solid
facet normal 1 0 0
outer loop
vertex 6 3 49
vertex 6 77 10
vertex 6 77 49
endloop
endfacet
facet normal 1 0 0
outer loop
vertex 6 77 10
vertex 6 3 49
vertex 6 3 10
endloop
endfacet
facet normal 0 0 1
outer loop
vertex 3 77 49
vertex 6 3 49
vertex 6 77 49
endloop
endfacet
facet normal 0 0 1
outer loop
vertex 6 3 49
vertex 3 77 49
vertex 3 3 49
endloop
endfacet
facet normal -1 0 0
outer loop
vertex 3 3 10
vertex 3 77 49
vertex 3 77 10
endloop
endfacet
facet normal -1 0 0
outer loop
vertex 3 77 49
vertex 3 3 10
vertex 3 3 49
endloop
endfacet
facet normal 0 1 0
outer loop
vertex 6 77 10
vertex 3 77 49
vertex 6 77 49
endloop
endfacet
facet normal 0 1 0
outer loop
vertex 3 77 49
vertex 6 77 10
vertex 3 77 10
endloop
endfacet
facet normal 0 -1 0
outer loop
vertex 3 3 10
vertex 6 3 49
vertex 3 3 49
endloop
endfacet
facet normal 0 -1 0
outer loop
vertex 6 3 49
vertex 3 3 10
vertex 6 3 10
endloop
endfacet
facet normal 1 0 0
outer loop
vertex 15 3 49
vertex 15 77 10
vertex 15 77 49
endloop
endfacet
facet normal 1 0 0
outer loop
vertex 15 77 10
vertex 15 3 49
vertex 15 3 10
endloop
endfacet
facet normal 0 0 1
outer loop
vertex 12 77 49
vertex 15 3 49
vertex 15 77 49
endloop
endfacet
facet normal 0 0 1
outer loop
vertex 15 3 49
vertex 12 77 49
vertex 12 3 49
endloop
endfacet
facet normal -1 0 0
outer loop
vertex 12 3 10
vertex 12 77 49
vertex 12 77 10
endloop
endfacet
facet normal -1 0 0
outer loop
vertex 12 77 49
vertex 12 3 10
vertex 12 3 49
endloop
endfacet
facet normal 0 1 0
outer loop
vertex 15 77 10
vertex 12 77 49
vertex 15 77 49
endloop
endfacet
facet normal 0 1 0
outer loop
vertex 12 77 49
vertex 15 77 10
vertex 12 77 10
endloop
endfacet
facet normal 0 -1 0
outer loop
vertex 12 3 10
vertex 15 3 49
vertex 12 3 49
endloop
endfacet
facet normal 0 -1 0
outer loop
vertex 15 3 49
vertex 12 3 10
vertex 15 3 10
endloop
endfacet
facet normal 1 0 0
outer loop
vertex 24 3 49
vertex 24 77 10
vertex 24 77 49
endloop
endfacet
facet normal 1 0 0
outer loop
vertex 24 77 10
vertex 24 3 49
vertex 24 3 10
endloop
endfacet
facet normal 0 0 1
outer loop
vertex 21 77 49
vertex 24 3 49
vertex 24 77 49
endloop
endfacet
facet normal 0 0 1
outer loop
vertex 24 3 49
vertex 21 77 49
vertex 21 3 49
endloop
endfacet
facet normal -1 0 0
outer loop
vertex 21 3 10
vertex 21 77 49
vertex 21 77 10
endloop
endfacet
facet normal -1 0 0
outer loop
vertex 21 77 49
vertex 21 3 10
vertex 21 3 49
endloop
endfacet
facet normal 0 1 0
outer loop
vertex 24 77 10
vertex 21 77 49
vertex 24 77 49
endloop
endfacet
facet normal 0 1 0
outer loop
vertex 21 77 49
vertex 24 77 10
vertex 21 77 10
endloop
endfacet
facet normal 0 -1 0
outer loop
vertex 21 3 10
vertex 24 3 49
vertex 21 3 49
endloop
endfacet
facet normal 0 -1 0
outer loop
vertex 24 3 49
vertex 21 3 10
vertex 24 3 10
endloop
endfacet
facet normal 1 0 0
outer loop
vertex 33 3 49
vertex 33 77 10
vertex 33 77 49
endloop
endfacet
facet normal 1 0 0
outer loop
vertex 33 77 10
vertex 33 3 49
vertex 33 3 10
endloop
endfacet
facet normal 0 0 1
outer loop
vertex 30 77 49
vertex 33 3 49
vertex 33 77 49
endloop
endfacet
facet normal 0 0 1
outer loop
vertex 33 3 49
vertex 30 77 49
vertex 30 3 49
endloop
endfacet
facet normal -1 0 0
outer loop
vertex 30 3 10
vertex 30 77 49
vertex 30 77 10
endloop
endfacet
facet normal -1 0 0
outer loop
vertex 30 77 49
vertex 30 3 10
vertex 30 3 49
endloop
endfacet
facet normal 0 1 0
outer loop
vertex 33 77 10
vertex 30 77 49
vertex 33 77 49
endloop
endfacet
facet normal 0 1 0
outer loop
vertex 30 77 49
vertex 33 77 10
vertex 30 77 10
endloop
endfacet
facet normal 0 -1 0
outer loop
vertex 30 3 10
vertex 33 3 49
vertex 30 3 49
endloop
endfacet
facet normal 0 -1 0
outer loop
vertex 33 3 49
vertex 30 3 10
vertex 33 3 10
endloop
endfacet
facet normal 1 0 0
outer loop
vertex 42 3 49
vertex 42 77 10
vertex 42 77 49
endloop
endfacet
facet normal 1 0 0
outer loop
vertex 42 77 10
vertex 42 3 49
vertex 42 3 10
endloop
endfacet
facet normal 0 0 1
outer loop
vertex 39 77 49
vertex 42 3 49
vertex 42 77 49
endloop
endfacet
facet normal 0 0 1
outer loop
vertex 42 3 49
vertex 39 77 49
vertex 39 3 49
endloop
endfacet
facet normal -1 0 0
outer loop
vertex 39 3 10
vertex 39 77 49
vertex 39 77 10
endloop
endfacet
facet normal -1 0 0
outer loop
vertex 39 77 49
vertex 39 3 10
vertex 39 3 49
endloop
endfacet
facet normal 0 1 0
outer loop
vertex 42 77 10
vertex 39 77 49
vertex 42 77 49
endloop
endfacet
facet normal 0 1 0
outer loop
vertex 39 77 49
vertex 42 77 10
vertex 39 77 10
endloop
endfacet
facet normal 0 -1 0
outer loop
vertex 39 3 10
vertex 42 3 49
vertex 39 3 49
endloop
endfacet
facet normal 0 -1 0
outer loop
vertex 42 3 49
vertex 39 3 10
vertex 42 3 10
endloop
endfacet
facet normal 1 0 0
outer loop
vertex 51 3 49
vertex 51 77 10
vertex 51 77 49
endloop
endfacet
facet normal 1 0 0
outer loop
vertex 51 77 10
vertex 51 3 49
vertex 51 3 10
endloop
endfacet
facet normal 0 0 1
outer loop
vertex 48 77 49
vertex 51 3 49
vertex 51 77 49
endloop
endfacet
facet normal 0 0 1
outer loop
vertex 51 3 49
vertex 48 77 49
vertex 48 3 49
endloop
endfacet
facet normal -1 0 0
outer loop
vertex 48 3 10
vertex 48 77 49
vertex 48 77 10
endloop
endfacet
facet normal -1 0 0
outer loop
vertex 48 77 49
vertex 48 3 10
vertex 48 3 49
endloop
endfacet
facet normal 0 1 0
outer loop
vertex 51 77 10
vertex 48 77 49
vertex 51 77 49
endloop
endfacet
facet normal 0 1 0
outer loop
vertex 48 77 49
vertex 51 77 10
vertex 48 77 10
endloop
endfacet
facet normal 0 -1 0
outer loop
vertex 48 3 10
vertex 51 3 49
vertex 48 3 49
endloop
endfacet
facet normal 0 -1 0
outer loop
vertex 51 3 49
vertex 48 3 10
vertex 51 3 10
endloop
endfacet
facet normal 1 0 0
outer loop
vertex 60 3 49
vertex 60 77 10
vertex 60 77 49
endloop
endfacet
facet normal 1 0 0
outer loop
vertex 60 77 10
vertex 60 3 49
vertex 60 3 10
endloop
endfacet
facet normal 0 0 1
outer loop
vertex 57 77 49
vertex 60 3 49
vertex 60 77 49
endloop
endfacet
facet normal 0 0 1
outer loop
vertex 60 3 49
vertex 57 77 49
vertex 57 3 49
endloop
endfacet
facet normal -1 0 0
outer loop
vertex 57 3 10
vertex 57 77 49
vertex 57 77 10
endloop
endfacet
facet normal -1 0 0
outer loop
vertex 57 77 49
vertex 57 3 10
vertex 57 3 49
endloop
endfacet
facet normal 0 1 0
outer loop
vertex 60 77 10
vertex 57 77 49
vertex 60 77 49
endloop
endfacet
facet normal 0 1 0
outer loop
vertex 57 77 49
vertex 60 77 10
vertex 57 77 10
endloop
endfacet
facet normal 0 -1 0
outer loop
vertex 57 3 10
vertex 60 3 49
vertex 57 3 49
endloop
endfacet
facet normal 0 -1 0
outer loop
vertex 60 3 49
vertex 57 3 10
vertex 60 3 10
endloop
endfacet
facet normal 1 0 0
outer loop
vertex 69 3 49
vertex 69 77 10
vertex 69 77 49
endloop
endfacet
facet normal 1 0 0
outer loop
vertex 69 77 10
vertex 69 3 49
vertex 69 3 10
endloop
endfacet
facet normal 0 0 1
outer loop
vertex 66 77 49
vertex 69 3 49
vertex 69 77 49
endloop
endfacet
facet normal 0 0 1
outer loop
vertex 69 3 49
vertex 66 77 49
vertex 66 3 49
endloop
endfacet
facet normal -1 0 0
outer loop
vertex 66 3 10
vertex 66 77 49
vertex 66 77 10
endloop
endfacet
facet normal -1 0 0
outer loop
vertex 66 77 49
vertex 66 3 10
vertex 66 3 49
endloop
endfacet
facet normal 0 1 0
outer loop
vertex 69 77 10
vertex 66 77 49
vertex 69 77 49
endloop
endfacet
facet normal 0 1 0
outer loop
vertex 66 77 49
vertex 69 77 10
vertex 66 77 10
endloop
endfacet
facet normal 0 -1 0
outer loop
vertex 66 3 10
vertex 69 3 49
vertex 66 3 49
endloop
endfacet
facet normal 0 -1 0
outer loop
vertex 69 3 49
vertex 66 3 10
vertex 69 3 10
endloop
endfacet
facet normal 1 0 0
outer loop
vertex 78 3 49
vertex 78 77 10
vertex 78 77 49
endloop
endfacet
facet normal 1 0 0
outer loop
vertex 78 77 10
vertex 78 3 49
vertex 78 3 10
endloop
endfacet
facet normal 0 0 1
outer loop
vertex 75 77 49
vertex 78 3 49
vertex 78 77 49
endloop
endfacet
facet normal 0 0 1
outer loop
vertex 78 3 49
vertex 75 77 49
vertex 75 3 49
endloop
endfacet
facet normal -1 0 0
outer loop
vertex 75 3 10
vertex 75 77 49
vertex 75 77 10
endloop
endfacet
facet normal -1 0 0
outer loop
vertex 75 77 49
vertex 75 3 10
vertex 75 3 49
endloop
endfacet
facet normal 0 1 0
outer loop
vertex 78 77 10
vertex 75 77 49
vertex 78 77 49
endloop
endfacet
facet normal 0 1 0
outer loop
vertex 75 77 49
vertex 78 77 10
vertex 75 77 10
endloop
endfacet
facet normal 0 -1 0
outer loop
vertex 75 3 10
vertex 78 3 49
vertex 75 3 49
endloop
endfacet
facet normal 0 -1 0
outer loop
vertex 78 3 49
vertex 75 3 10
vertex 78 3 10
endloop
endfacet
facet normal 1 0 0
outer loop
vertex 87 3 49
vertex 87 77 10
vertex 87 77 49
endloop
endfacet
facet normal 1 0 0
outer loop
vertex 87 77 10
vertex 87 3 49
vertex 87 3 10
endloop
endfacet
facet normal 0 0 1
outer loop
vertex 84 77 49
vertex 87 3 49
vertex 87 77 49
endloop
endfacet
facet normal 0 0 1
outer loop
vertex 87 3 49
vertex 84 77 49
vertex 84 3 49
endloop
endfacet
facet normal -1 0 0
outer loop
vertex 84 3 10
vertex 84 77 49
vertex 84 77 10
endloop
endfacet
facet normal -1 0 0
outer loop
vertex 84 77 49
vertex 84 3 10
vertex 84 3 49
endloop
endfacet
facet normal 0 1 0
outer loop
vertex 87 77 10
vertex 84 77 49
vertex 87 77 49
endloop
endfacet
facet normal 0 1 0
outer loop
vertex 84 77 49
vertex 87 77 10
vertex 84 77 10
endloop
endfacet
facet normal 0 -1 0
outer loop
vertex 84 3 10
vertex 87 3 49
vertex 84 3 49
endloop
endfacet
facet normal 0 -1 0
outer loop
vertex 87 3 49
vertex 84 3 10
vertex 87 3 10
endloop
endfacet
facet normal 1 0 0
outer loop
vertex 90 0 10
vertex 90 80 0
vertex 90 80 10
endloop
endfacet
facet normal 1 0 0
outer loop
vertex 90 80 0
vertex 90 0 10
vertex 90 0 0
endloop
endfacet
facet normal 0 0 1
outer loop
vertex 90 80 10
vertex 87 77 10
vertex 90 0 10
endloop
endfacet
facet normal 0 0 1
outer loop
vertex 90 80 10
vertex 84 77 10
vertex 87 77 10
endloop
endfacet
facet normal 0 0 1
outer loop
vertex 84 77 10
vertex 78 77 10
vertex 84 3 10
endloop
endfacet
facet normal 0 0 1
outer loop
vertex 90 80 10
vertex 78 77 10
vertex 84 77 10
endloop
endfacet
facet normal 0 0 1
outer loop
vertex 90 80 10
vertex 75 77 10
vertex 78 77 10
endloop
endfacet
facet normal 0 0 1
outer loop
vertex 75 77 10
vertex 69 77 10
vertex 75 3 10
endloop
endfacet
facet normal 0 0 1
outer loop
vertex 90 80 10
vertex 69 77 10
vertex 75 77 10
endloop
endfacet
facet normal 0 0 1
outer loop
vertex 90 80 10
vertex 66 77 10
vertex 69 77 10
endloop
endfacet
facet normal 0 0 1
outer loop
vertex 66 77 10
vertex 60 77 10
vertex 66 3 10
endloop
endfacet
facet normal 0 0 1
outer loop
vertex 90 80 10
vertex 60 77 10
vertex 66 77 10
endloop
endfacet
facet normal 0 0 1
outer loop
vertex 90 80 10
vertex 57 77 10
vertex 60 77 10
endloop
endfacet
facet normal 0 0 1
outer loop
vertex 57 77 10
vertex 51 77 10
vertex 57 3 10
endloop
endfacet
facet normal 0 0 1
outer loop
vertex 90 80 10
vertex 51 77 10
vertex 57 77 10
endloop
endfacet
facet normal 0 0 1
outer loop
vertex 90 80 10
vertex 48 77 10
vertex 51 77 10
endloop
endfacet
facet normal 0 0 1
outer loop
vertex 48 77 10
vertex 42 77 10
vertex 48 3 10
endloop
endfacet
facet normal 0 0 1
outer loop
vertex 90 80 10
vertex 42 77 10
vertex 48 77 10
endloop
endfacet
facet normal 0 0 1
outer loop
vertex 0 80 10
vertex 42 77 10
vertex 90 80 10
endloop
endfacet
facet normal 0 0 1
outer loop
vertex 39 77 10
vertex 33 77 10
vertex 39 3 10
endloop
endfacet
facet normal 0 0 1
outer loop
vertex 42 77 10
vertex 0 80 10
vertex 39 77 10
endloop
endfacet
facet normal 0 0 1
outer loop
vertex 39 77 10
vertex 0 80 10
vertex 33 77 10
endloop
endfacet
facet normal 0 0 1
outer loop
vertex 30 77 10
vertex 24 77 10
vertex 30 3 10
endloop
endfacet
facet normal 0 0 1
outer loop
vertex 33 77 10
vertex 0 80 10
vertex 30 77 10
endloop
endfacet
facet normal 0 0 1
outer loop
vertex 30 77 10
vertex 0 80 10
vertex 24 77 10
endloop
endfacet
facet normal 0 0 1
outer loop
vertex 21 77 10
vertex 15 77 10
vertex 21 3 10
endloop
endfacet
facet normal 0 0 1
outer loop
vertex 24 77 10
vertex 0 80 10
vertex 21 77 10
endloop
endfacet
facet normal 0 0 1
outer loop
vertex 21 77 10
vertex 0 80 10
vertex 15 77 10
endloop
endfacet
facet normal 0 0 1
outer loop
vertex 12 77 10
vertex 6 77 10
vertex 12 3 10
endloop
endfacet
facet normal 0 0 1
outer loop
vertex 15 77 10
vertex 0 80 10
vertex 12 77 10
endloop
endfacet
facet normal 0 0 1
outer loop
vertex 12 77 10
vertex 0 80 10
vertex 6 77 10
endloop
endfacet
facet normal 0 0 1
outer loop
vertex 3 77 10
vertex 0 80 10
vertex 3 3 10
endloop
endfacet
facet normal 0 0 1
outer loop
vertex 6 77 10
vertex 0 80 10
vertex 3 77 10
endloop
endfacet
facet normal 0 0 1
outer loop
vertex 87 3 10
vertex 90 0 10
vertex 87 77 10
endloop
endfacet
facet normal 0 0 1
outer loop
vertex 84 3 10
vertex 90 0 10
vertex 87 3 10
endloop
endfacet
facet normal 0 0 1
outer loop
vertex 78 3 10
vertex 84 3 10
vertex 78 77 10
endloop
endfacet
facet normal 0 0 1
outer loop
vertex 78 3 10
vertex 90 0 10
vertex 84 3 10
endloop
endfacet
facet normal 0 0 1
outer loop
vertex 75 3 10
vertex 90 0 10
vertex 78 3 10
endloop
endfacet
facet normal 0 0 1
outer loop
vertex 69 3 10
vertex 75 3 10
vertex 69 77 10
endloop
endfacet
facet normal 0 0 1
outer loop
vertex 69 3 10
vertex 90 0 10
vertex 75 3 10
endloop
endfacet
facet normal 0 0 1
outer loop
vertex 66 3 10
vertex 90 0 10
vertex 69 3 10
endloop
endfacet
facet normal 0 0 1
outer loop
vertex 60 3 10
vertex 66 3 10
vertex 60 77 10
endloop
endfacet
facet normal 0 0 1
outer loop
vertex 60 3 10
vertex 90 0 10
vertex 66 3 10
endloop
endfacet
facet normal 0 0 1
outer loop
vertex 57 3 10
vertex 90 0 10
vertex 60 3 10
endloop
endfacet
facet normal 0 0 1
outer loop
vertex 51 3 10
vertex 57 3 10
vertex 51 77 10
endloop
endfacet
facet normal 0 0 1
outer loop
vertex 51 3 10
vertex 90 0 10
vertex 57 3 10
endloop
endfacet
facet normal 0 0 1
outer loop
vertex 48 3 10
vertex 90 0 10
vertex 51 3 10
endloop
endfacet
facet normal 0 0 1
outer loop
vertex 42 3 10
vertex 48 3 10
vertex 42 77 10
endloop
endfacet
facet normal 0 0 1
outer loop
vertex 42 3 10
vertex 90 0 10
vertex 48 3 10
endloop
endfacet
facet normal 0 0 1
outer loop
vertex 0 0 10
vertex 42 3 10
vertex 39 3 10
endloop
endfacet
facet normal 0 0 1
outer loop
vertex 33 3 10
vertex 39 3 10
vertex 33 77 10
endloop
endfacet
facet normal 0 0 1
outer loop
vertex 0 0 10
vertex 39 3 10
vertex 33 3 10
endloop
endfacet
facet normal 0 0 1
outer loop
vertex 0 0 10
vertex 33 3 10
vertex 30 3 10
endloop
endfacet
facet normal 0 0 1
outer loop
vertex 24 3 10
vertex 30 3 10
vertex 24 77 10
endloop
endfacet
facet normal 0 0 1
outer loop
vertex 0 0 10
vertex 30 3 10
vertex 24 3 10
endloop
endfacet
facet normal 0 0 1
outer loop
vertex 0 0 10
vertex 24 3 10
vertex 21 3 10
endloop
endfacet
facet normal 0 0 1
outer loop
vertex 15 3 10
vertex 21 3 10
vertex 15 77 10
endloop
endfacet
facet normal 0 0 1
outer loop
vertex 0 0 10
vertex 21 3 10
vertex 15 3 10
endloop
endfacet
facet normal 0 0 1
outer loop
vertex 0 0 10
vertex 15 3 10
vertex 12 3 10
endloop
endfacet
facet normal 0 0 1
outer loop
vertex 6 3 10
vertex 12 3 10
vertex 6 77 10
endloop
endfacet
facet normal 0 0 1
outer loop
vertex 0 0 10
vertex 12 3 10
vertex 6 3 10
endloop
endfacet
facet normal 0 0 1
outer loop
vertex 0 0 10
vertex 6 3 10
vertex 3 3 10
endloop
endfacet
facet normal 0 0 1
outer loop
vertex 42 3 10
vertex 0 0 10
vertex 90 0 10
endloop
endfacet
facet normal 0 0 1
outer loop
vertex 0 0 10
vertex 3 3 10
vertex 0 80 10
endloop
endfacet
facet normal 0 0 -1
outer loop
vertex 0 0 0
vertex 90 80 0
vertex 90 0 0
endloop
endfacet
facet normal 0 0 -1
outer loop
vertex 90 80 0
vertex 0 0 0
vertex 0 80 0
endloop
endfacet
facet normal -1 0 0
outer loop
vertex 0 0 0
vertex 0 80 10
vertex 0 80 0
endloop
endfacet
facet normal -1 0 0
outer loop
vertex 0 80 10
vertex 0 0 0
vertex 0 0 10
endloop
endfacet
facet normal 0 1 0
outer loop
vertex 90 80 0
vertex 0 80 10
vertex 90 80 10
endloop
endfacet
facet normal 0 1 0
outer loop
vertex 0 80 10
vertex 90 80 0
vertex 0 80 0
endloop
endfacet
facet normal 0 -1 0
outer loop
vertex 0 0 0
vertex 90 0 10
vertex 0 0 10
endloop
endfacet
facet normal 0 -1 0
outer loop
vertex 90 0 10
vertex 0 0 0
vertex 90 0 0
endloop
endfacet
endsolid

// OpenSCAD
$fn = 32;

// ----------------------------------------------------------------------
// Heatsink: uniform fin block
// ----------------------------------------------------------------------

// --- parameters (mm) ---
base_l = 90;              // base length, X
base_w = 80;              // base width, Y
base_t = 10;              // base plate thickness
fin_h = 40;               // fin height above the base
fin_t = 3;                // fin thickness
edge = 3;                 // margin from the base ends
pitch = 9;                // fin pitch

n_fins = floor((base_l - 2 * edge - fin_t) / pitch) + 1;  // fin count
total_h = base_t + fin_h - 1;  // overall height

union() {
  cube([base_l, base_w, base_t]);
  for (i = [0 : n_fins - 1])
    translate([edge + i * pitch, edge, base_t - 1])
      cube([fin_t, base_w - 2 * edge, fin_h]);
}
